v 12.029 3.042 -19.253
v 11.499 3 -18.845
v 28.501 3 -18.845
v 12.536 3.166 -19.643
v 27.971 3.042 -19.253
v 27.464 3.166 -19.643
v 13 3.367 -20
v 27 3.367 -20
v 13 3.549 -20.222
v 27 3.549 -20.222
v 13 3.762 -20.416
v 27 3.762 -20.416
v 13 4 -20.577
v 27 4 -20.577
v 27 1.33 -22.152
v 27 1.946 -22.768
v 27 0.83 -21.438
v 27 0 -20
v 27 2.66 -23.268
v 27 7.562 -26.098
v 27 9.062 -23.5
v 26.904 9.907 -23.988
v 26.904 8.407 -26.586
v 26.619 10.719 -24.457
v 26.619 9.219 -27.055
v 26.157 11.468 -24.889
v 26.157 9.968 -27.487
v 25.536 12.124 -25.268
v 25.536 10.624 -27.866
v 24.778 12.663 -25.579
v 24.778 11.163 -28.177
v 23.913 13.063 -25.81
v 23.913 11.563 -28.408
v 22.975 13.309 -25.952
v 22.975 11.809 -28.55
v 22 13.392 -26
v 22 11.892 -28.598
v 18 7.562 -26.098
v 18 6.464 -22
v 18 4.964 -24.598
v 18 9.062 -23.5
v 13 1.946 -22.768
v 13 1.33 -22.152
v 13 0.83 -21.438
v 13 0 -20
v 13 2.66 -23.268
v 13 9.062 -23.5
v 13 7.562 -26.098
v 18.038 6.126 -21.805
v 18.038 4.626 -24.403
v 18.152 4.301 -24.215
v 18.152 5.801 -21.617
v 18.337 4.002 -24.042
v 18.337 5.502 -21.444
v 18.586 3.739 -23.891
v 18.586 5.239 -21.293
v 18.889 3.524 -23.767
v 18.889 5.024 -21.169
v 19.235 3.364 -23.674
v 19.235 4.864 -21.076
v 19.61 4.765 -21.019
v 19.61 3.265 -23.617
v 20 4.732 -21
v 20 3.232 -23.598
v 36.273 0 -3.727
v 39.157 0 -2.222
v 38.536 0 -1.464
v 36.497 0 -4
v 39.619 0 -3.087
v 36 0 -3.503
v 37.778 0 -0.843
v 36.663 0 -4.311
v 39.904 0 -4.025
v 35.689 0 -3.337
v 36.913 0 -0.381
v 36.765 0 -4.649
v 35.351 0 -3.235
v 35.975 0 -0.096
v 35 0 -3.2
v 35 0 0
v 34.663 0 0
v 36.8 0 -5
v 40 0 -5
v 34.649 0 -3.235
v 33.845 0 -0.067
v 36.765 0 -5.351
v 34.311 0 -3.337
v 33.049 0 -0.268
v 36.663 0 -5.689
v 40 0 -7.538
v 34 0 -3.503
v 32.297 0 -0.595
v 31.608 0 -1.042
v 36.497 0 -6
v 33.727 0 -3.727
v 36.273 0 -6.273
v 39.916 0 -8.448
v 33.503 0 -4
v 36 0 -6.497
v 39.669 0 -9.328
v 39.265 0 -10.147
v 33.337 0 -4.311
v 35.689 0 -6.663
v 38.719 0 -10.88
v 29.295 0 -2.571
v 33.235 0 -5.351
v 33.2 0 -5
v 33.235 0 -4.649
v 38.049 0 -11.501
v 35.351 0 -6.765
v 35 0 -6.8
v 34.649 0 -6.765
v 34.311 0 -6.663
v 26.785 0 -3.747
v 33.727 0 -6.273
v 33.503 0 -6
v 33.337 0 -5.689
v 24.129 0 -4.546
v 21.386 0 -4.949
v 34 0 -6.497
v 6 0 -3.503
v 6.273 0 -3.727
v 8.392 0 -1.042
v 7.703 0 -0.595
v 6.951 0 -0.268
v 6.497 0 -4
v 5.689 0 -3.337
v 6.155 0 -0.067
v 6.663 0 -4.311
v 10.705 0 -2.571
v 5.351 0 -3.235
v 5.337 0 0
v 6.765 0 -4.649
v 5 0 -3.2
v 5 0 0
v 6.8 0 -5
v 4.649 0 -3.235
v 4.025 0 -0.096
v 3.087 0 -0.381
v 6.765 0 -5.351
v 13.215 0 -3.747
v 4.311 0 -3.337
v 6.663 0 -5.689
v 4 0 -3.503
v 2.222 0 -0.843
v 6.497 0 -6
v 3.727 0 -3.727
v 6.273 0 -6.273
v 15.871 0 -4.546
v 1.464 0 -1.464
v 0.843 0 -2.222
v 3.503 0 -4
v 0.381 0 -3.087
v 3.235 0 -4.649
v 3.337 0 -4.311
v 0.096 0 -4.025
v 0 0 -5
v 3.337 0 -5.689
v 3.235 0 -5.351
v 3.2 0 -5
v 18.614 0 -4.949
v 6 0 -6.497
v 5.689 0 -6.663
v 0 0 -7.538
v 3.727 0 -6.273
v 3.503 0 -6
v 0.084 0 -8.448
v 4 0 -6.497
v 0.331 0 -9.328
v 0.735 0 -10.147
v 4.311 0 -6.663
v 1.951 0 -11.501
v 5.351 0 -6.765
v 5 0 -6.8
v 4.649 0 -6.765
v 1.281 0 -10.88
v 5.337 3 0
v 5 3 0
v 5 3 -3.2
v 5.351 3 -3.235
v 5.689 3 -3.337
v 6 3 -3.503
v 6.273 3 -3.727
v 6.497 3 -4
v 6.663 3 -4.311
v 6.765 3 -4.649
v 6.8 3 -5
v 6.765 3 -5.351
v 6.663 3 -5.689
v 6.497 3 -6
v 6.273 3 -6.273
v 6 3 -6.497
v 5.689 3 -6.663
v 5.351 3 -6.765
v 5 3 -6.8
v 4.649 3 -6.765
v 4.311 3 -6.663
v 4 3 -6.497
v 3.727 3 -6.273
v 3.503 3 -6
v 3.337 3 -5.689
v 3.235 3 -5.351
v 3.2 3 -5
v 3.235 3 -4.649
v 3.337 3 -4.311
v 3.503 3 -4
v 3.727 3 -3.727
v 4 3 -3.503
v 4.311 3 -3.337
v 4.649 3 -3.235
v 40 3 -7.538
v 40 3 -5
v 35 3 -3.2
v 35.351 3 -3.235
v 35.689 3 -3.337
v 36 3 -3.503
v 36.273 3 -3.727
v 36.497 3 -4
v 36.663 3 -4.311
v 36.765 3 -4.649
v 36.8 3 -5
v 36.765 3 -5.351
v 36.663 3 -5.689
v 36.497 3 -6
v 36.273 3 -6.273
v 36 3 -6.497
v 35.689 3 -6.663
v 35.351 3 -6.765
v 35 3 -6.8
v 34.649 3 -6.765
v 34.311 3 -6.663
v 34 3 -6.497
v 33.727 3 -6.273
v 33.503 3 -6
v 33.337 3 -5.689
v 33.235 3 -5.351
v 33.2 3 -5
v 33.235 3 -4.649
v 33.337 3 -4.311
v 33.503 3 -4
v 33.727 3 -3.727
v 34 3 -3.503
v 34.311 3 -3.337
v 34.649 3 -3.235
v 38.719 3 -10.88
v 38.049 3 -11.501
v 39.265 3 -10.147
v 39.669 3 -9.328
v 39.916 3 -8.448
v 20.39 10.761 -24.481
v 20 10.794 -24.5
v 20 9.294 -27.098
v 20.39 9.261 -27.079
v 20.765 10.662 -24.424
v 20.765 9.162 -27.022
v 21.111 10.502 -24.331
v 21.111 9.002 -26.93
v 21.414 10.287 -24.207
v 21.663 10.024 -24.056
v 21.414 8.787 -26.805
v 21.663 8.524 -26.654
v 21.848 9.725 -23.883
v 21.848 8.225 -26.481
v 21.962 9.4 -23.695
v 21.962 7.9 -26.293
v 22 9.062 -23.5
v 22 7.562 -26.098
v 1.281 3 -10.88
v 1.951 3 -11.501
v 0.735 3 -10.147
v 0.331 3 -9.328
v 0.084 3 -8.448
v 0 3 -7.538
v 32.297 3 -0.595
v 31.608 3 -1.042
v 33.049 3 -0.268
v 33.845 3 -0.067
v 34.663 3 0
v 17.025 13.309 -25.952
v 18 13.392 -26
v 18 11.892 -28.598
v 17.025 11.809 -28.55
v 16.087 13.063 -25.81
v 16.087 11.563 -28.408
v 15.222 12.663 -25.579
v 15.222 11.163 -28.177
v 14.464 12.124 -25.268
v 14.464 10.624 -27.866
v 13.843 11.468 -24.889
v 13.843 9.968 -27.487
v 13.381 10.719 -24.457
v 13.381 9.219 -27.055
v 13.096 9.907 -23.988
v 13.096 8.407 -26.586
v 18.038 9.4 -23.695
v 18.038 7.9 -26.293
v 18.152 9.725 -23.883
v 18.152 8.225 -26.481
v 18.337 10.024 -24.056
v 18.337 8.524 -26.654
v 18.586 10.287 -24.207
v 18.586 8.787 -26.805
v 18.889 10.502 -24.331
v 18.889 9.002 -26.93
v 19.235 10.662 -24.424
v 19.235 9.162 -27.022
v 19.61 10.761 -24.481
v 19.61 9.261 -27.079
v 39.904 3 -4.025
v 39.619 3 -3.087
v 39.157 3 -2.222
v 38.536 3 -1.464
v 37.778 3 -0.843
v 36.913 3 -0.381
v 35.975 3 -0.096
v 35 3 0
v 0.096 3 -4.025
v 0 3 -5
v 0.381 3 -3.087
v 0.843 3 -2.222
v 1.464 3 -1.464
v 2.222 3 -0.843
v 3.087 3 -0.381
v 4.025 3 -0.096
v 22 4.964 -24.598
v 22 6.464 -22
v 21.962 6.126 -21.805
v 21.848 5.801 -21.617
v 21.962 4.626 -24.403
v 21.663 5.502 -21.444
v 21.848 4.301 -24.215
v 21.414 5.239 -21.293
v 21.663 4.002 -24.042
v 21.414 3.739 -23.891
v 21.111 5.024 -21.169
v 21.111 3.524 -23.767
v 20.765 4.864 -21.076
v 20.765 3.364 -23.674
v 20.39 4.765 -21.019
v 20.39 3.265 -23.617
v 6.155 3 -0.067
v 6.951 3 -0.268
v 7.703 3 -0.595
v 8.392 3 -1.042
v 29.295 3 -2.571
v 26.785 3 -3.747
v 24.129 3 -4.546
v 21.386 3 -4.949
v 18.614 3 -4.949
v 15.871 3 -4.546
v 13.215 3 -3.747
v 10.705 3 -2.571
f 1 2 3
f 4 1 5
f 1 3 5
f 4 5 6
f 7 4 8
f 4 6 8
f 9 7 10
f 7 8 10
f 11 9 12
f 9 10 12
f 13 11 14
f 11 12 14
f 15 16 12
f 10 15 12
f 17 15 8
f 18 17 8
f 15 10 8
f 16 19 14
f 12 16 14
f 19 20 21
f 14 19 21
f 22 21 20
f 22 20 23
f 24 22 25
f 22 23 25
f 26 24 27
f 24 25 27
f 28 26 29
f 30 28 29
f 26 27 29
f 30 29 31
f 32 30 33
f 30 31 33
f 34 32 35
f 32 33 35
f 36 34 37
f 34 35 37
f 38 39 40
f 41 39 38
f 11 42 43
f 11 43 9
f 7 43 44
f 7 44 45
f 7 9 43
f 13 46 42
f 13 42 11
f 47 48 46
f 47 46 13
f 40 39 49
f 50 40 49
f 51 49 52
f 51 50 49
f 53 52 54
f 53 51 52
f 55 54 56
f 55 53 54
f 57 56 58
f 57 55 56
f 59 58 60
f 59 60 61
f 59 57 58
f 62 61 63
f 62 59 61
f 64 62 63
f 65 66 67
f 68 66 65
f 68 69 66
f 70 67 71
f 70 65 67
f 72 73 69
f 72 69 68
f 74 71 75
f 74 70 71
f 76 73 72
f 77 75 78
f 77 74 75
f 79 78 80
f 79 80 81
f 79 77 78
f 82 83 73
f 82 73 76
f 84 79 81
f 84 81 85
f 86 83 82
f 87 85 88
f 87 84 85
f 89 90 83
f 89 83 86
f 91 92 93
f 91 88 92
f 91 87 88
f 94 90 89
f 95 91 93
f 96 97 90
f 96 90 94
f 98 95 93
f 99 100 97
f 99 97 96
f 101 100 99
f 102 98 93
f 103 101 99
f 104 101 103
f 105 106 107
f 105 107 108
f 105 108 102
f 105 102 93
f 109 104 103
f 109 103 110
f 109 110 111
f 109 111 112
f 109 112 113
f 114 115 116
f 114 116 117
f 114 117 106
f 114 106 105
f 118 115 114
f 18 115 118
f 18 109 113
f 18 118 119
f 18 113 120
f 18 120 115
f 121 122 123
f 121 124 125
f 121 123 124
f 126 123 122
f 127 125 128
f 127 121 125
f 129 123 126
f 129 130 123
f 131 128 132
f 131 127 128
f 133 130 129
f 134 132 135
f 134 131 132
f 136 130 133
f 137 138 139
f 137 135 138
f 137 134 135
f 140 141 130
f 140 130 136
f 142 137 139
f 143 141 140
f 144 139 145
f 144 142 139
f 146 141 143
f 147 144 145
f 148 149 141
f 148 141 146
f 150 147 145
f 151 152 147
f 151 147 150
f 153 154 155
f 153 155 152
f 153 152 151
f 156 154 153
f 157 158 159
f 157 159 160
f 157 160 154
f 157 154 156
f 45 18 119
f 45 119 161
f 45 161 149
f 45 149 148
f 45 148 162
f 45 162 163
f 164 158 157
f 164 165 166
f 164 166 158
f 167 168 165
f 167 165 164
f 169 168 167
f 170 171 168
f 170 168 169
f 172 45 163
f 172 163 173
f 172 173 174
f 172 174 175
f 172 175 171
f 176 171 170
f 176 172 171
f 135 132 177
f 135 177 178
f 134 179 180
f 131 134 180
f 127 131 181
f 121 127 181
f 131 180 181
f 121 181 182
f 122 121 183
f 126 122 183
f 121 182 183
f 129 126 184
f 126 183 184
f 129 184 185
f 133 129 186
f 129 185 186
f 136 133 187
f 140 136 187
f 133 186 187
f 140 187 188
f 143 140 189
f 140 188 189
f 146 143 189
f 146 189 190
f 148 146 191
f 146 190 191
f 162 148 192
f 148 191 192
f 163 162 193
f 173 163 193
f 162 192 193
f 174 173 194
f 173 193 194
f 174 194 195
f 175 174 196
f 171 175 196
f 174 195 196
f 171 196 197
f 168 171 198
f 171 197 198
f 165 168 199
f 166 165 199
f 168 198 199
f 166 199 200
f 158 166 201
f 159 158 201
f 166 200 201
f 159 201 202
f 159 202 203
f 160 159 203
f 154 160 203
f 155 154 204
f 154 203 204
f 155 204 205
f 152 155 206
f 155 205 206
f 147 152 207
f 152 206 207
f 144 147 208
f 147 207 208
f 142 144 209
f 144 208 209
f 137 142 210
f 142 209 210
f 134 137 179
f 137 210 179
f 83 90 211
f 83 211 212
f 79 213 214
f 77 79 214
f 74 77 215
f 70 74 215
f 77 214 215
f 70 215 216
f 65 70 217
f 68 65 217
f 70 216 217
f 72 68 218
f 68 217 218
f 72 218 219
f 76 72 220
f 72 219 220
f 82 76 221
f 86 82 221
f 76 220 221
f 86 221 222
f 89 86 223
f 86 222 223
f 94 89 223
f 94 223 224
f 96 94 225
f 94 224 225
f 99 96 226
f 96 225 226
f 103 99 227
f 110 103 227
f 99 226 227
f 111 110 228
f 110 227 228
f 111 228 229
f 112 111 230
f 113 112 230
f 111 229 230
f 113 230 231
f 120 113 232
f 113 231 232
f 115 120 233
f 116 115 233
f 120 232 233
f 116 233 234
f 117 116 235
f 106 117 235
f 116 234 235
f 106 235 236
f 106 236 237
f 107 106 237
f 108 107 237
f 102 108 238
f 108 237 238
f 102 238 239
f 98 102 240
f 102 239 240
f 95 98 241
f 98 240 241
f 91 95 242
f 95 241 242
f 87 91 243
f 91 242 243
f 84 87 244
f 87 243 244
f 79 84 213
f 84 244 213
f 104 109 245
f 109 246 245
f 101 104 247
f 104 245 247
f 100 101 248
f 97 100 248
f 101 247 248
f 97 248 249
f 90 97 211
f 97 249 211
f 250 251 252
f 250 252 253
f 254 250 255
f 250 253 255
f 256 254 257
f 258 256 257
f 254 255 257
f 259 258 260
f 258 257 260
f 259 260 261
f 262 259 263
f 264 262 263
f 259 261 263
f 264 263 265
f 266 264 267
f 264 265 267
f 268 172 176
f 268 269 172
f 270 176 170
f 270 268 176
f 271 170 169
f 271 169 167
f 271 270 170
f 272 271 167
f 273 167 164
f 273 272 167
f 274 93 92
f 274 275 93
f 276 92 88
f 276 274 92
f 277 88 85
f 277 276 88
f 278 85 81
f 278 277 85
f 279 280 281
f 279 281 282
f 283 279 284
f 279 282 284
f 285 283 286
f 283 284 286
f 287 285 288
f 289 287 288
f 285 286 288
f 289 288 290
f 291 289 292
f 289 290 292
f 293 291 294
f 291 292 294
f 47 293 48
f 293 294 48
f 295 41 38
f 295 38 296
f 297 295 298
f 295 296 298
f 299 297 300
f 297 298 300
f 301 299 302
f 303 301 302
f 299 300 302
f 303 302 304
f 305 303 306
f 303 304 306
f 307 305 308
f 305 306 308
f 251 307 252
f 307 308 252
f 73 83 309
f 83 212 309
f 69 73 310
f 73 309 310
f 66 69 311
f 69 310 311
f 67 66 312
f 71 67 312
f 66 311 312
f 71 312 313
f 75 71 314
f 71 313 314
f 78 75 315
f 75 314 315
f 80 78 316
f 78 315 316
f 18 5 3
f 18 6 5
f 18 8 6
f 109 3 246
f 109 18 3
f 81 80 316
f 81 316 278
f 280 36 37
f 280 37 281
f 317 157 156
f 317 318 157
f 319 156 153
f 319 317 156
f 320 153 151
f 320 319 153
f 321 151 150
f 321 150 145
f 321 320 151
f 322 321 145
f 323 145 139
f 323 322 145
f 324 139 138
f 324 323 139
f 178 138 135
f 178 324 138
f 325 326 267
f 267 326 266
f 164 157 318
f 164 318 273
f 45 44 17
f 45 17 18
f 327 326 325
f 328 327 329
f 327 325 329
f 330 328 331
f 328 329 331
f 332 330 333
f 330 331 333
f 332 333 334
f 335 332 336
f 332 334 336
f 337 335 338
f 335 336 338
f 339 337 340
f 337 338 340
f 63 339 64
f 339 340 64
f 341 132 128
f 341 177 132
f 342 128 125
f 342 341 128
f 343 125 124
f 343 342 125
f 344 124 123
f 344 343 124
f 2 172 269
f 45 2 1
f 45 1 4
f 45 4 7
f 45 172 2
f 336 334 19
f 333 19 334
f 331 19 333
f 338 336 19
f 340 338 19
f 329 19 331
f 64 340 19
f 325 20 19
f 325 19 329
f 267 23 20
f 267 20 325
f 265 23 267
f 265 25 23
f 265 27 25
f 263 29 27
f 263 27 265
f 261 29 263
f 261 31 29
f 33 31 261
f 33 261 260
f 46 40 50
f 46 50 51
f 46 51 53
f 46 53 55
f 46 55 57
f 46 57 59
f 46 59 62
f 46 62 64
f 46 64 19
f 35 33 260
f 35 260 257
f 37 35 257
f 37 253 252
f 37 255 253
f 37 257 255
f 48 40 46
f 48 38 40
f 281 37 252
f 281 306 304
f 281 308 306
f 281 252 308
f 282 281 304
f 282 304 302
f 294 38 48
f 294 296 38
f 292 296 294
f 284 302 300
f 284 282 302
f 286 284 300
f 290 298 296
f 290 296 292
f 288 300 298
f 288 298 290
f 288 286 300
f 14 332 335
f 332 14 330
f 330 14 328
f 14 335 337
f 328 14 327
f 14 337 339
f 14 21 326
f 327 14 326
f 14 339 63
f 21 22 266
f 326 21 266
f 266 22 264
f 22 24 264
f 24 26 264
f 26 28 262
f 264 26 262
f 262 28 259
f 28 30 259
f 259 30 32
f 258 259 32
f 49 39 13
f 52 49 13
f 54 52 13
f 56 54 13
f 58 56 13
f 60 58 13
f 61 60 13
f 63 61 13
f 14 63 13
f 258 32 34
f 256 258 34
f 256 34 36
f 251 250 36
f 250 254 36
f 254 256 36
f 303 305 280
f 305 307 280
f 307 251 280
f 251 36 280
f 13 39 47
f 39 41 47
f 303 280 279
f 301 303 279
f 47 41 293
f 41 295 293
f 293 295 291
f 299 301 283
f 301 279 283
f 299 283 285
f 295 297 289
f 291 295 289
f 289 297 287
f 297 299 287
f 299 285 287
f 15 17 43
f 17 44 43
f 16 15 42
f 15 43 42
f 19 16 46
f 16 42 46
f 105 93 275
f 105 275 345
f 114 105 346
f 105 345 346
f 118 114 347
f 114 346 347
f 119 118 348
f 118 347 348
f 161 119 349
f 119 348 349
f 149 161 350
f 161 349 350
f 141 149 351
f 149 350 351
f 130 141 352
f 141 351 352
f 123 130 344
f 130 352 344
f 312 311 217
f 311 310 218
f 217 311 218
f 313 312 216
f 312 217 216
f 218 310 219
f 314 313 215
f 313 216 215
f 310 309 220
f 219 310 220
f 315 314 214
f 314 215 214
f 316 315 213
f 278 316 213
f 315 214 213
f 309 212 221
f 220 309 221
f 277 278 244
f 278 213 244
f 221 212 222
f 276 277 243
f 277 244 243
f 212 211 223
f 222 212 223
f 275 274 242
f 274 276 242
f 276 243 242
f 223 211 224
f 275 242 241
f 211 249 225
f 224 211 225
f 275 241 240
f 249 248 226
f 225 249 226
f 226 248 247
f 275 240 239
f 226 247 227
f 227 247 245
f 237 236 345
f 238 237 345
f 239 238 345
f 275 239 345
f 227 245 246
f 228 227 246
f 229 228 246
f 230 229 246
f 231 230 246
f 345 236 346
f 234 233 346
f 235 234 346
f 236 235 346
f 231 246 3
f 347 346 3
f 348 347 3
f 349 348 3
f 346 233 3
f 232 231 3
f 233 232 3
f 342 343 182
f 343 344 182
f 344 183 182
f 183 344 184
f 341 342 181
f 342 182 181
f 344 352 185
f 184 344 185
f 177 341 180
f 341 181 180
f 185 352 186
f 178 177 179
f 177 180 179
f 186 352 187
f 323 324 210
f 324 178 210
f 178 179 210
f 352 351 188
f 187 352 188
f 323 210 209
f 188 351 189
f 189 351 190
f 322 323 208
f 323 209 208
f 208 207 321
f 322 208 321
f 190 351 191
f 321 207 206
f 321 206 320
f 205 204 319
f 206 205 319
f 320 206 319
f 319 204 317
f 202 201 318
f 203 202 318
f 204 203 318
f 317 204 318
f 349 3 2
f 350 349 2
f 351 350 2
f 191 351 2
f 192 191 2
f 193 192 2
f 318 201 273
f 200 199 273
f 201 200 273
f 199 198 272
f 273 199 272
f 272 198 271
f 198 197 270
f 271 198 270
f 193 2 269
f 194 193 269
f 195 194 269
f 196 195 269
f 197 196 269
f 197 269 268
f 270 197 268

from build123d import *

# Parameters (mm, degrees)
BOSS_EXTRUDE1_DEPTH = 3
SKETCH3_R           = 1.8
CUT_EXTRUDE1_DEPTH  = 3
SKETCH4_W           = 14
SKETCH4_H           = 12
BOSS_EXTRUDE2_DEPTH = 3
BOSS_EXTRUDE3_DEPTH = 14
SKETCH6_W           = 4
SKETCH6_H           = 7
CUT_EXTRUDE2_DEPTH  = 3
FILLET1_R           = 2
FILLET2_R           = 5
FILLET3_R           = 5
FILLET4_R           = 5
SKETCH7_R           = 19
CUT_EXTRUDE3_DEPTH  = 3
FILLET5_R           = 5
FILLET7_R           = 2


with BuildPart() as part:
    # Sketch2 → Boss-Extrude1 (new body)
    with BuildSketch(Plane(origin=(0, 0, 0), x_dir=(1, 0, 0), z_dir=(0, 1, 0))):
        Polygon((0, 10), (13, 20), (27, 20), (40, 10), (40, 0), (0, 0), align=None)
    extrude(amount=BOSS_EXTRUDE1_DEPTH)

    # Sketch3 → Cut-Extrude1 (cut)
    with BuildSketch(Plane(origin=(0, 3, 0), x_dir=(1, 0, 0), z_dir=(0, 1, 0))):
        with Locations(Location((5, 5, 0), (0, 0, 270))):
            Circle(SKETCH3_R)
        with Locations(Location((35, 5, 0), (0, 0, 270))):
            Circle(SKETCH3_R)
    extrude(amount=-CUT_EXTRUDE1_DEPTH, mode=Mode.SUBTRACT)



with BuildPart() as body_2:
    # Sketch4 → Boss-Extrude2 (new body)
    with BuildSketch(Plane(origin=(0, -7.910254038, -13.700961894), x_dir=(-1, 0, 0), z_dir=(0, -0.5000000000000041, -0.8660254037844364))):
        with Locations((-20, 18.598076211)):
            Rectangle(SKETCH4_W, SKETCH4_H)
    extrude(amount=BOSS_EXTRUDE2_DEPTH)


with BuildPart() as part_1:
    add(part.part)

    add(body_2.part)  # Boss-Extrude3 merges body 2
    # Sketch5 → Boss-Extrude3 (add)
    with BuildSketch(Plane.ZY.offset(-13)):
        Polygon((-22.598076211, 1.5), (-20, 0), (-20, 3), align=None)
    extrude(amount=-BOSS_EXTRUDE3_DEPTH)

    # Sketch6 → Cut-Extrude2 (cut)
    with BuildSketch(Plane(origin=(0, -7.910254038, -13.700961894), x_dir=(1, 0, 0), z_dir=(0, 0.5000000000000042, 0.8660254037844363))):
        with Locations((20, 18.098076211)):
            Rectangle(SKETCH6_W, SKETCH6_H)
    extrude(amount=-CUT_EXTRUDE2_DEPTH, mode=Mode.SUBTRACT)

    # Fillet1
    fillet1_edges = [part_1.edges().sort_by_distance(p)[0] for p in [
        (22, 3.982050808, -22.299038106),
        (18, 3.982050808, -22.299038106),
        (18, 10.044228634, -25.799038106),
        (22, 10.044228634, -25.799038106),
    ]]
    fillet(fillet1_edges, radius=FILLET1_R - 0.0001)  # a hair under: the kernel refuses the full size

    # Fillet2
    fillet2_edges = [part_1.edges().sort_by_distance(p)[0] for p in [
        (13, 12.642304845, -27.299038106),
        (27, 12.642304845, -27.299038106),
    ]]
    fillet(fillet2_edges, radius=FILLET2_R)

    # Fillet3
    fillet3_edges = [part_1.edges().sort_by_distance(p)[0] for p in [
        (0, 1.5, -10),
        (40, 1.5, -10),
        (40, 1.5, 0),
        (0, 1.5, 0),
    ]]
    fillet(fillet3_edges, radius=FILLET3_R)

    # Fillet4
    fillet4_edges = [part_1.edges().sort_by_distance(p)[0] for p in [
        (20, 1.5, -22.598076211),
    ]]
    fillet(fillet4_edges, radius=FILLET4_R)

    # Sketch7 → Cut-Extrude3 (cut)
    with BuildSketch(Plane(origin=(0, 3, 0), x_dir=(1, 0, 0), z_dir=(0, 1, 0))):
        with Locations((20, -14)):
            Circle(SKETCH7_R)
    extrude(amount=-CUT_EXTRUDE3_DEPTH, mode=Mode.SUBTRACT)

    # Fillet5
    fillet5_edges = [part_1.edges().sort_by_distance(p)[0] for p in [
        (7.154767421, 1.5, 0),
        (32.845232579, 1.5, 0),
    ]]
    fillet(fillet5_edges, radius=FILLET5_R)

    # Fillet7
    fillet7_edges = [part_1.edges().sort_by_distance(p)[0] for p in [
        (20, 3, -20),
    ]]
    fillet(fillet7_edges, radius=FILLET7_R)


solid = part_1.part
